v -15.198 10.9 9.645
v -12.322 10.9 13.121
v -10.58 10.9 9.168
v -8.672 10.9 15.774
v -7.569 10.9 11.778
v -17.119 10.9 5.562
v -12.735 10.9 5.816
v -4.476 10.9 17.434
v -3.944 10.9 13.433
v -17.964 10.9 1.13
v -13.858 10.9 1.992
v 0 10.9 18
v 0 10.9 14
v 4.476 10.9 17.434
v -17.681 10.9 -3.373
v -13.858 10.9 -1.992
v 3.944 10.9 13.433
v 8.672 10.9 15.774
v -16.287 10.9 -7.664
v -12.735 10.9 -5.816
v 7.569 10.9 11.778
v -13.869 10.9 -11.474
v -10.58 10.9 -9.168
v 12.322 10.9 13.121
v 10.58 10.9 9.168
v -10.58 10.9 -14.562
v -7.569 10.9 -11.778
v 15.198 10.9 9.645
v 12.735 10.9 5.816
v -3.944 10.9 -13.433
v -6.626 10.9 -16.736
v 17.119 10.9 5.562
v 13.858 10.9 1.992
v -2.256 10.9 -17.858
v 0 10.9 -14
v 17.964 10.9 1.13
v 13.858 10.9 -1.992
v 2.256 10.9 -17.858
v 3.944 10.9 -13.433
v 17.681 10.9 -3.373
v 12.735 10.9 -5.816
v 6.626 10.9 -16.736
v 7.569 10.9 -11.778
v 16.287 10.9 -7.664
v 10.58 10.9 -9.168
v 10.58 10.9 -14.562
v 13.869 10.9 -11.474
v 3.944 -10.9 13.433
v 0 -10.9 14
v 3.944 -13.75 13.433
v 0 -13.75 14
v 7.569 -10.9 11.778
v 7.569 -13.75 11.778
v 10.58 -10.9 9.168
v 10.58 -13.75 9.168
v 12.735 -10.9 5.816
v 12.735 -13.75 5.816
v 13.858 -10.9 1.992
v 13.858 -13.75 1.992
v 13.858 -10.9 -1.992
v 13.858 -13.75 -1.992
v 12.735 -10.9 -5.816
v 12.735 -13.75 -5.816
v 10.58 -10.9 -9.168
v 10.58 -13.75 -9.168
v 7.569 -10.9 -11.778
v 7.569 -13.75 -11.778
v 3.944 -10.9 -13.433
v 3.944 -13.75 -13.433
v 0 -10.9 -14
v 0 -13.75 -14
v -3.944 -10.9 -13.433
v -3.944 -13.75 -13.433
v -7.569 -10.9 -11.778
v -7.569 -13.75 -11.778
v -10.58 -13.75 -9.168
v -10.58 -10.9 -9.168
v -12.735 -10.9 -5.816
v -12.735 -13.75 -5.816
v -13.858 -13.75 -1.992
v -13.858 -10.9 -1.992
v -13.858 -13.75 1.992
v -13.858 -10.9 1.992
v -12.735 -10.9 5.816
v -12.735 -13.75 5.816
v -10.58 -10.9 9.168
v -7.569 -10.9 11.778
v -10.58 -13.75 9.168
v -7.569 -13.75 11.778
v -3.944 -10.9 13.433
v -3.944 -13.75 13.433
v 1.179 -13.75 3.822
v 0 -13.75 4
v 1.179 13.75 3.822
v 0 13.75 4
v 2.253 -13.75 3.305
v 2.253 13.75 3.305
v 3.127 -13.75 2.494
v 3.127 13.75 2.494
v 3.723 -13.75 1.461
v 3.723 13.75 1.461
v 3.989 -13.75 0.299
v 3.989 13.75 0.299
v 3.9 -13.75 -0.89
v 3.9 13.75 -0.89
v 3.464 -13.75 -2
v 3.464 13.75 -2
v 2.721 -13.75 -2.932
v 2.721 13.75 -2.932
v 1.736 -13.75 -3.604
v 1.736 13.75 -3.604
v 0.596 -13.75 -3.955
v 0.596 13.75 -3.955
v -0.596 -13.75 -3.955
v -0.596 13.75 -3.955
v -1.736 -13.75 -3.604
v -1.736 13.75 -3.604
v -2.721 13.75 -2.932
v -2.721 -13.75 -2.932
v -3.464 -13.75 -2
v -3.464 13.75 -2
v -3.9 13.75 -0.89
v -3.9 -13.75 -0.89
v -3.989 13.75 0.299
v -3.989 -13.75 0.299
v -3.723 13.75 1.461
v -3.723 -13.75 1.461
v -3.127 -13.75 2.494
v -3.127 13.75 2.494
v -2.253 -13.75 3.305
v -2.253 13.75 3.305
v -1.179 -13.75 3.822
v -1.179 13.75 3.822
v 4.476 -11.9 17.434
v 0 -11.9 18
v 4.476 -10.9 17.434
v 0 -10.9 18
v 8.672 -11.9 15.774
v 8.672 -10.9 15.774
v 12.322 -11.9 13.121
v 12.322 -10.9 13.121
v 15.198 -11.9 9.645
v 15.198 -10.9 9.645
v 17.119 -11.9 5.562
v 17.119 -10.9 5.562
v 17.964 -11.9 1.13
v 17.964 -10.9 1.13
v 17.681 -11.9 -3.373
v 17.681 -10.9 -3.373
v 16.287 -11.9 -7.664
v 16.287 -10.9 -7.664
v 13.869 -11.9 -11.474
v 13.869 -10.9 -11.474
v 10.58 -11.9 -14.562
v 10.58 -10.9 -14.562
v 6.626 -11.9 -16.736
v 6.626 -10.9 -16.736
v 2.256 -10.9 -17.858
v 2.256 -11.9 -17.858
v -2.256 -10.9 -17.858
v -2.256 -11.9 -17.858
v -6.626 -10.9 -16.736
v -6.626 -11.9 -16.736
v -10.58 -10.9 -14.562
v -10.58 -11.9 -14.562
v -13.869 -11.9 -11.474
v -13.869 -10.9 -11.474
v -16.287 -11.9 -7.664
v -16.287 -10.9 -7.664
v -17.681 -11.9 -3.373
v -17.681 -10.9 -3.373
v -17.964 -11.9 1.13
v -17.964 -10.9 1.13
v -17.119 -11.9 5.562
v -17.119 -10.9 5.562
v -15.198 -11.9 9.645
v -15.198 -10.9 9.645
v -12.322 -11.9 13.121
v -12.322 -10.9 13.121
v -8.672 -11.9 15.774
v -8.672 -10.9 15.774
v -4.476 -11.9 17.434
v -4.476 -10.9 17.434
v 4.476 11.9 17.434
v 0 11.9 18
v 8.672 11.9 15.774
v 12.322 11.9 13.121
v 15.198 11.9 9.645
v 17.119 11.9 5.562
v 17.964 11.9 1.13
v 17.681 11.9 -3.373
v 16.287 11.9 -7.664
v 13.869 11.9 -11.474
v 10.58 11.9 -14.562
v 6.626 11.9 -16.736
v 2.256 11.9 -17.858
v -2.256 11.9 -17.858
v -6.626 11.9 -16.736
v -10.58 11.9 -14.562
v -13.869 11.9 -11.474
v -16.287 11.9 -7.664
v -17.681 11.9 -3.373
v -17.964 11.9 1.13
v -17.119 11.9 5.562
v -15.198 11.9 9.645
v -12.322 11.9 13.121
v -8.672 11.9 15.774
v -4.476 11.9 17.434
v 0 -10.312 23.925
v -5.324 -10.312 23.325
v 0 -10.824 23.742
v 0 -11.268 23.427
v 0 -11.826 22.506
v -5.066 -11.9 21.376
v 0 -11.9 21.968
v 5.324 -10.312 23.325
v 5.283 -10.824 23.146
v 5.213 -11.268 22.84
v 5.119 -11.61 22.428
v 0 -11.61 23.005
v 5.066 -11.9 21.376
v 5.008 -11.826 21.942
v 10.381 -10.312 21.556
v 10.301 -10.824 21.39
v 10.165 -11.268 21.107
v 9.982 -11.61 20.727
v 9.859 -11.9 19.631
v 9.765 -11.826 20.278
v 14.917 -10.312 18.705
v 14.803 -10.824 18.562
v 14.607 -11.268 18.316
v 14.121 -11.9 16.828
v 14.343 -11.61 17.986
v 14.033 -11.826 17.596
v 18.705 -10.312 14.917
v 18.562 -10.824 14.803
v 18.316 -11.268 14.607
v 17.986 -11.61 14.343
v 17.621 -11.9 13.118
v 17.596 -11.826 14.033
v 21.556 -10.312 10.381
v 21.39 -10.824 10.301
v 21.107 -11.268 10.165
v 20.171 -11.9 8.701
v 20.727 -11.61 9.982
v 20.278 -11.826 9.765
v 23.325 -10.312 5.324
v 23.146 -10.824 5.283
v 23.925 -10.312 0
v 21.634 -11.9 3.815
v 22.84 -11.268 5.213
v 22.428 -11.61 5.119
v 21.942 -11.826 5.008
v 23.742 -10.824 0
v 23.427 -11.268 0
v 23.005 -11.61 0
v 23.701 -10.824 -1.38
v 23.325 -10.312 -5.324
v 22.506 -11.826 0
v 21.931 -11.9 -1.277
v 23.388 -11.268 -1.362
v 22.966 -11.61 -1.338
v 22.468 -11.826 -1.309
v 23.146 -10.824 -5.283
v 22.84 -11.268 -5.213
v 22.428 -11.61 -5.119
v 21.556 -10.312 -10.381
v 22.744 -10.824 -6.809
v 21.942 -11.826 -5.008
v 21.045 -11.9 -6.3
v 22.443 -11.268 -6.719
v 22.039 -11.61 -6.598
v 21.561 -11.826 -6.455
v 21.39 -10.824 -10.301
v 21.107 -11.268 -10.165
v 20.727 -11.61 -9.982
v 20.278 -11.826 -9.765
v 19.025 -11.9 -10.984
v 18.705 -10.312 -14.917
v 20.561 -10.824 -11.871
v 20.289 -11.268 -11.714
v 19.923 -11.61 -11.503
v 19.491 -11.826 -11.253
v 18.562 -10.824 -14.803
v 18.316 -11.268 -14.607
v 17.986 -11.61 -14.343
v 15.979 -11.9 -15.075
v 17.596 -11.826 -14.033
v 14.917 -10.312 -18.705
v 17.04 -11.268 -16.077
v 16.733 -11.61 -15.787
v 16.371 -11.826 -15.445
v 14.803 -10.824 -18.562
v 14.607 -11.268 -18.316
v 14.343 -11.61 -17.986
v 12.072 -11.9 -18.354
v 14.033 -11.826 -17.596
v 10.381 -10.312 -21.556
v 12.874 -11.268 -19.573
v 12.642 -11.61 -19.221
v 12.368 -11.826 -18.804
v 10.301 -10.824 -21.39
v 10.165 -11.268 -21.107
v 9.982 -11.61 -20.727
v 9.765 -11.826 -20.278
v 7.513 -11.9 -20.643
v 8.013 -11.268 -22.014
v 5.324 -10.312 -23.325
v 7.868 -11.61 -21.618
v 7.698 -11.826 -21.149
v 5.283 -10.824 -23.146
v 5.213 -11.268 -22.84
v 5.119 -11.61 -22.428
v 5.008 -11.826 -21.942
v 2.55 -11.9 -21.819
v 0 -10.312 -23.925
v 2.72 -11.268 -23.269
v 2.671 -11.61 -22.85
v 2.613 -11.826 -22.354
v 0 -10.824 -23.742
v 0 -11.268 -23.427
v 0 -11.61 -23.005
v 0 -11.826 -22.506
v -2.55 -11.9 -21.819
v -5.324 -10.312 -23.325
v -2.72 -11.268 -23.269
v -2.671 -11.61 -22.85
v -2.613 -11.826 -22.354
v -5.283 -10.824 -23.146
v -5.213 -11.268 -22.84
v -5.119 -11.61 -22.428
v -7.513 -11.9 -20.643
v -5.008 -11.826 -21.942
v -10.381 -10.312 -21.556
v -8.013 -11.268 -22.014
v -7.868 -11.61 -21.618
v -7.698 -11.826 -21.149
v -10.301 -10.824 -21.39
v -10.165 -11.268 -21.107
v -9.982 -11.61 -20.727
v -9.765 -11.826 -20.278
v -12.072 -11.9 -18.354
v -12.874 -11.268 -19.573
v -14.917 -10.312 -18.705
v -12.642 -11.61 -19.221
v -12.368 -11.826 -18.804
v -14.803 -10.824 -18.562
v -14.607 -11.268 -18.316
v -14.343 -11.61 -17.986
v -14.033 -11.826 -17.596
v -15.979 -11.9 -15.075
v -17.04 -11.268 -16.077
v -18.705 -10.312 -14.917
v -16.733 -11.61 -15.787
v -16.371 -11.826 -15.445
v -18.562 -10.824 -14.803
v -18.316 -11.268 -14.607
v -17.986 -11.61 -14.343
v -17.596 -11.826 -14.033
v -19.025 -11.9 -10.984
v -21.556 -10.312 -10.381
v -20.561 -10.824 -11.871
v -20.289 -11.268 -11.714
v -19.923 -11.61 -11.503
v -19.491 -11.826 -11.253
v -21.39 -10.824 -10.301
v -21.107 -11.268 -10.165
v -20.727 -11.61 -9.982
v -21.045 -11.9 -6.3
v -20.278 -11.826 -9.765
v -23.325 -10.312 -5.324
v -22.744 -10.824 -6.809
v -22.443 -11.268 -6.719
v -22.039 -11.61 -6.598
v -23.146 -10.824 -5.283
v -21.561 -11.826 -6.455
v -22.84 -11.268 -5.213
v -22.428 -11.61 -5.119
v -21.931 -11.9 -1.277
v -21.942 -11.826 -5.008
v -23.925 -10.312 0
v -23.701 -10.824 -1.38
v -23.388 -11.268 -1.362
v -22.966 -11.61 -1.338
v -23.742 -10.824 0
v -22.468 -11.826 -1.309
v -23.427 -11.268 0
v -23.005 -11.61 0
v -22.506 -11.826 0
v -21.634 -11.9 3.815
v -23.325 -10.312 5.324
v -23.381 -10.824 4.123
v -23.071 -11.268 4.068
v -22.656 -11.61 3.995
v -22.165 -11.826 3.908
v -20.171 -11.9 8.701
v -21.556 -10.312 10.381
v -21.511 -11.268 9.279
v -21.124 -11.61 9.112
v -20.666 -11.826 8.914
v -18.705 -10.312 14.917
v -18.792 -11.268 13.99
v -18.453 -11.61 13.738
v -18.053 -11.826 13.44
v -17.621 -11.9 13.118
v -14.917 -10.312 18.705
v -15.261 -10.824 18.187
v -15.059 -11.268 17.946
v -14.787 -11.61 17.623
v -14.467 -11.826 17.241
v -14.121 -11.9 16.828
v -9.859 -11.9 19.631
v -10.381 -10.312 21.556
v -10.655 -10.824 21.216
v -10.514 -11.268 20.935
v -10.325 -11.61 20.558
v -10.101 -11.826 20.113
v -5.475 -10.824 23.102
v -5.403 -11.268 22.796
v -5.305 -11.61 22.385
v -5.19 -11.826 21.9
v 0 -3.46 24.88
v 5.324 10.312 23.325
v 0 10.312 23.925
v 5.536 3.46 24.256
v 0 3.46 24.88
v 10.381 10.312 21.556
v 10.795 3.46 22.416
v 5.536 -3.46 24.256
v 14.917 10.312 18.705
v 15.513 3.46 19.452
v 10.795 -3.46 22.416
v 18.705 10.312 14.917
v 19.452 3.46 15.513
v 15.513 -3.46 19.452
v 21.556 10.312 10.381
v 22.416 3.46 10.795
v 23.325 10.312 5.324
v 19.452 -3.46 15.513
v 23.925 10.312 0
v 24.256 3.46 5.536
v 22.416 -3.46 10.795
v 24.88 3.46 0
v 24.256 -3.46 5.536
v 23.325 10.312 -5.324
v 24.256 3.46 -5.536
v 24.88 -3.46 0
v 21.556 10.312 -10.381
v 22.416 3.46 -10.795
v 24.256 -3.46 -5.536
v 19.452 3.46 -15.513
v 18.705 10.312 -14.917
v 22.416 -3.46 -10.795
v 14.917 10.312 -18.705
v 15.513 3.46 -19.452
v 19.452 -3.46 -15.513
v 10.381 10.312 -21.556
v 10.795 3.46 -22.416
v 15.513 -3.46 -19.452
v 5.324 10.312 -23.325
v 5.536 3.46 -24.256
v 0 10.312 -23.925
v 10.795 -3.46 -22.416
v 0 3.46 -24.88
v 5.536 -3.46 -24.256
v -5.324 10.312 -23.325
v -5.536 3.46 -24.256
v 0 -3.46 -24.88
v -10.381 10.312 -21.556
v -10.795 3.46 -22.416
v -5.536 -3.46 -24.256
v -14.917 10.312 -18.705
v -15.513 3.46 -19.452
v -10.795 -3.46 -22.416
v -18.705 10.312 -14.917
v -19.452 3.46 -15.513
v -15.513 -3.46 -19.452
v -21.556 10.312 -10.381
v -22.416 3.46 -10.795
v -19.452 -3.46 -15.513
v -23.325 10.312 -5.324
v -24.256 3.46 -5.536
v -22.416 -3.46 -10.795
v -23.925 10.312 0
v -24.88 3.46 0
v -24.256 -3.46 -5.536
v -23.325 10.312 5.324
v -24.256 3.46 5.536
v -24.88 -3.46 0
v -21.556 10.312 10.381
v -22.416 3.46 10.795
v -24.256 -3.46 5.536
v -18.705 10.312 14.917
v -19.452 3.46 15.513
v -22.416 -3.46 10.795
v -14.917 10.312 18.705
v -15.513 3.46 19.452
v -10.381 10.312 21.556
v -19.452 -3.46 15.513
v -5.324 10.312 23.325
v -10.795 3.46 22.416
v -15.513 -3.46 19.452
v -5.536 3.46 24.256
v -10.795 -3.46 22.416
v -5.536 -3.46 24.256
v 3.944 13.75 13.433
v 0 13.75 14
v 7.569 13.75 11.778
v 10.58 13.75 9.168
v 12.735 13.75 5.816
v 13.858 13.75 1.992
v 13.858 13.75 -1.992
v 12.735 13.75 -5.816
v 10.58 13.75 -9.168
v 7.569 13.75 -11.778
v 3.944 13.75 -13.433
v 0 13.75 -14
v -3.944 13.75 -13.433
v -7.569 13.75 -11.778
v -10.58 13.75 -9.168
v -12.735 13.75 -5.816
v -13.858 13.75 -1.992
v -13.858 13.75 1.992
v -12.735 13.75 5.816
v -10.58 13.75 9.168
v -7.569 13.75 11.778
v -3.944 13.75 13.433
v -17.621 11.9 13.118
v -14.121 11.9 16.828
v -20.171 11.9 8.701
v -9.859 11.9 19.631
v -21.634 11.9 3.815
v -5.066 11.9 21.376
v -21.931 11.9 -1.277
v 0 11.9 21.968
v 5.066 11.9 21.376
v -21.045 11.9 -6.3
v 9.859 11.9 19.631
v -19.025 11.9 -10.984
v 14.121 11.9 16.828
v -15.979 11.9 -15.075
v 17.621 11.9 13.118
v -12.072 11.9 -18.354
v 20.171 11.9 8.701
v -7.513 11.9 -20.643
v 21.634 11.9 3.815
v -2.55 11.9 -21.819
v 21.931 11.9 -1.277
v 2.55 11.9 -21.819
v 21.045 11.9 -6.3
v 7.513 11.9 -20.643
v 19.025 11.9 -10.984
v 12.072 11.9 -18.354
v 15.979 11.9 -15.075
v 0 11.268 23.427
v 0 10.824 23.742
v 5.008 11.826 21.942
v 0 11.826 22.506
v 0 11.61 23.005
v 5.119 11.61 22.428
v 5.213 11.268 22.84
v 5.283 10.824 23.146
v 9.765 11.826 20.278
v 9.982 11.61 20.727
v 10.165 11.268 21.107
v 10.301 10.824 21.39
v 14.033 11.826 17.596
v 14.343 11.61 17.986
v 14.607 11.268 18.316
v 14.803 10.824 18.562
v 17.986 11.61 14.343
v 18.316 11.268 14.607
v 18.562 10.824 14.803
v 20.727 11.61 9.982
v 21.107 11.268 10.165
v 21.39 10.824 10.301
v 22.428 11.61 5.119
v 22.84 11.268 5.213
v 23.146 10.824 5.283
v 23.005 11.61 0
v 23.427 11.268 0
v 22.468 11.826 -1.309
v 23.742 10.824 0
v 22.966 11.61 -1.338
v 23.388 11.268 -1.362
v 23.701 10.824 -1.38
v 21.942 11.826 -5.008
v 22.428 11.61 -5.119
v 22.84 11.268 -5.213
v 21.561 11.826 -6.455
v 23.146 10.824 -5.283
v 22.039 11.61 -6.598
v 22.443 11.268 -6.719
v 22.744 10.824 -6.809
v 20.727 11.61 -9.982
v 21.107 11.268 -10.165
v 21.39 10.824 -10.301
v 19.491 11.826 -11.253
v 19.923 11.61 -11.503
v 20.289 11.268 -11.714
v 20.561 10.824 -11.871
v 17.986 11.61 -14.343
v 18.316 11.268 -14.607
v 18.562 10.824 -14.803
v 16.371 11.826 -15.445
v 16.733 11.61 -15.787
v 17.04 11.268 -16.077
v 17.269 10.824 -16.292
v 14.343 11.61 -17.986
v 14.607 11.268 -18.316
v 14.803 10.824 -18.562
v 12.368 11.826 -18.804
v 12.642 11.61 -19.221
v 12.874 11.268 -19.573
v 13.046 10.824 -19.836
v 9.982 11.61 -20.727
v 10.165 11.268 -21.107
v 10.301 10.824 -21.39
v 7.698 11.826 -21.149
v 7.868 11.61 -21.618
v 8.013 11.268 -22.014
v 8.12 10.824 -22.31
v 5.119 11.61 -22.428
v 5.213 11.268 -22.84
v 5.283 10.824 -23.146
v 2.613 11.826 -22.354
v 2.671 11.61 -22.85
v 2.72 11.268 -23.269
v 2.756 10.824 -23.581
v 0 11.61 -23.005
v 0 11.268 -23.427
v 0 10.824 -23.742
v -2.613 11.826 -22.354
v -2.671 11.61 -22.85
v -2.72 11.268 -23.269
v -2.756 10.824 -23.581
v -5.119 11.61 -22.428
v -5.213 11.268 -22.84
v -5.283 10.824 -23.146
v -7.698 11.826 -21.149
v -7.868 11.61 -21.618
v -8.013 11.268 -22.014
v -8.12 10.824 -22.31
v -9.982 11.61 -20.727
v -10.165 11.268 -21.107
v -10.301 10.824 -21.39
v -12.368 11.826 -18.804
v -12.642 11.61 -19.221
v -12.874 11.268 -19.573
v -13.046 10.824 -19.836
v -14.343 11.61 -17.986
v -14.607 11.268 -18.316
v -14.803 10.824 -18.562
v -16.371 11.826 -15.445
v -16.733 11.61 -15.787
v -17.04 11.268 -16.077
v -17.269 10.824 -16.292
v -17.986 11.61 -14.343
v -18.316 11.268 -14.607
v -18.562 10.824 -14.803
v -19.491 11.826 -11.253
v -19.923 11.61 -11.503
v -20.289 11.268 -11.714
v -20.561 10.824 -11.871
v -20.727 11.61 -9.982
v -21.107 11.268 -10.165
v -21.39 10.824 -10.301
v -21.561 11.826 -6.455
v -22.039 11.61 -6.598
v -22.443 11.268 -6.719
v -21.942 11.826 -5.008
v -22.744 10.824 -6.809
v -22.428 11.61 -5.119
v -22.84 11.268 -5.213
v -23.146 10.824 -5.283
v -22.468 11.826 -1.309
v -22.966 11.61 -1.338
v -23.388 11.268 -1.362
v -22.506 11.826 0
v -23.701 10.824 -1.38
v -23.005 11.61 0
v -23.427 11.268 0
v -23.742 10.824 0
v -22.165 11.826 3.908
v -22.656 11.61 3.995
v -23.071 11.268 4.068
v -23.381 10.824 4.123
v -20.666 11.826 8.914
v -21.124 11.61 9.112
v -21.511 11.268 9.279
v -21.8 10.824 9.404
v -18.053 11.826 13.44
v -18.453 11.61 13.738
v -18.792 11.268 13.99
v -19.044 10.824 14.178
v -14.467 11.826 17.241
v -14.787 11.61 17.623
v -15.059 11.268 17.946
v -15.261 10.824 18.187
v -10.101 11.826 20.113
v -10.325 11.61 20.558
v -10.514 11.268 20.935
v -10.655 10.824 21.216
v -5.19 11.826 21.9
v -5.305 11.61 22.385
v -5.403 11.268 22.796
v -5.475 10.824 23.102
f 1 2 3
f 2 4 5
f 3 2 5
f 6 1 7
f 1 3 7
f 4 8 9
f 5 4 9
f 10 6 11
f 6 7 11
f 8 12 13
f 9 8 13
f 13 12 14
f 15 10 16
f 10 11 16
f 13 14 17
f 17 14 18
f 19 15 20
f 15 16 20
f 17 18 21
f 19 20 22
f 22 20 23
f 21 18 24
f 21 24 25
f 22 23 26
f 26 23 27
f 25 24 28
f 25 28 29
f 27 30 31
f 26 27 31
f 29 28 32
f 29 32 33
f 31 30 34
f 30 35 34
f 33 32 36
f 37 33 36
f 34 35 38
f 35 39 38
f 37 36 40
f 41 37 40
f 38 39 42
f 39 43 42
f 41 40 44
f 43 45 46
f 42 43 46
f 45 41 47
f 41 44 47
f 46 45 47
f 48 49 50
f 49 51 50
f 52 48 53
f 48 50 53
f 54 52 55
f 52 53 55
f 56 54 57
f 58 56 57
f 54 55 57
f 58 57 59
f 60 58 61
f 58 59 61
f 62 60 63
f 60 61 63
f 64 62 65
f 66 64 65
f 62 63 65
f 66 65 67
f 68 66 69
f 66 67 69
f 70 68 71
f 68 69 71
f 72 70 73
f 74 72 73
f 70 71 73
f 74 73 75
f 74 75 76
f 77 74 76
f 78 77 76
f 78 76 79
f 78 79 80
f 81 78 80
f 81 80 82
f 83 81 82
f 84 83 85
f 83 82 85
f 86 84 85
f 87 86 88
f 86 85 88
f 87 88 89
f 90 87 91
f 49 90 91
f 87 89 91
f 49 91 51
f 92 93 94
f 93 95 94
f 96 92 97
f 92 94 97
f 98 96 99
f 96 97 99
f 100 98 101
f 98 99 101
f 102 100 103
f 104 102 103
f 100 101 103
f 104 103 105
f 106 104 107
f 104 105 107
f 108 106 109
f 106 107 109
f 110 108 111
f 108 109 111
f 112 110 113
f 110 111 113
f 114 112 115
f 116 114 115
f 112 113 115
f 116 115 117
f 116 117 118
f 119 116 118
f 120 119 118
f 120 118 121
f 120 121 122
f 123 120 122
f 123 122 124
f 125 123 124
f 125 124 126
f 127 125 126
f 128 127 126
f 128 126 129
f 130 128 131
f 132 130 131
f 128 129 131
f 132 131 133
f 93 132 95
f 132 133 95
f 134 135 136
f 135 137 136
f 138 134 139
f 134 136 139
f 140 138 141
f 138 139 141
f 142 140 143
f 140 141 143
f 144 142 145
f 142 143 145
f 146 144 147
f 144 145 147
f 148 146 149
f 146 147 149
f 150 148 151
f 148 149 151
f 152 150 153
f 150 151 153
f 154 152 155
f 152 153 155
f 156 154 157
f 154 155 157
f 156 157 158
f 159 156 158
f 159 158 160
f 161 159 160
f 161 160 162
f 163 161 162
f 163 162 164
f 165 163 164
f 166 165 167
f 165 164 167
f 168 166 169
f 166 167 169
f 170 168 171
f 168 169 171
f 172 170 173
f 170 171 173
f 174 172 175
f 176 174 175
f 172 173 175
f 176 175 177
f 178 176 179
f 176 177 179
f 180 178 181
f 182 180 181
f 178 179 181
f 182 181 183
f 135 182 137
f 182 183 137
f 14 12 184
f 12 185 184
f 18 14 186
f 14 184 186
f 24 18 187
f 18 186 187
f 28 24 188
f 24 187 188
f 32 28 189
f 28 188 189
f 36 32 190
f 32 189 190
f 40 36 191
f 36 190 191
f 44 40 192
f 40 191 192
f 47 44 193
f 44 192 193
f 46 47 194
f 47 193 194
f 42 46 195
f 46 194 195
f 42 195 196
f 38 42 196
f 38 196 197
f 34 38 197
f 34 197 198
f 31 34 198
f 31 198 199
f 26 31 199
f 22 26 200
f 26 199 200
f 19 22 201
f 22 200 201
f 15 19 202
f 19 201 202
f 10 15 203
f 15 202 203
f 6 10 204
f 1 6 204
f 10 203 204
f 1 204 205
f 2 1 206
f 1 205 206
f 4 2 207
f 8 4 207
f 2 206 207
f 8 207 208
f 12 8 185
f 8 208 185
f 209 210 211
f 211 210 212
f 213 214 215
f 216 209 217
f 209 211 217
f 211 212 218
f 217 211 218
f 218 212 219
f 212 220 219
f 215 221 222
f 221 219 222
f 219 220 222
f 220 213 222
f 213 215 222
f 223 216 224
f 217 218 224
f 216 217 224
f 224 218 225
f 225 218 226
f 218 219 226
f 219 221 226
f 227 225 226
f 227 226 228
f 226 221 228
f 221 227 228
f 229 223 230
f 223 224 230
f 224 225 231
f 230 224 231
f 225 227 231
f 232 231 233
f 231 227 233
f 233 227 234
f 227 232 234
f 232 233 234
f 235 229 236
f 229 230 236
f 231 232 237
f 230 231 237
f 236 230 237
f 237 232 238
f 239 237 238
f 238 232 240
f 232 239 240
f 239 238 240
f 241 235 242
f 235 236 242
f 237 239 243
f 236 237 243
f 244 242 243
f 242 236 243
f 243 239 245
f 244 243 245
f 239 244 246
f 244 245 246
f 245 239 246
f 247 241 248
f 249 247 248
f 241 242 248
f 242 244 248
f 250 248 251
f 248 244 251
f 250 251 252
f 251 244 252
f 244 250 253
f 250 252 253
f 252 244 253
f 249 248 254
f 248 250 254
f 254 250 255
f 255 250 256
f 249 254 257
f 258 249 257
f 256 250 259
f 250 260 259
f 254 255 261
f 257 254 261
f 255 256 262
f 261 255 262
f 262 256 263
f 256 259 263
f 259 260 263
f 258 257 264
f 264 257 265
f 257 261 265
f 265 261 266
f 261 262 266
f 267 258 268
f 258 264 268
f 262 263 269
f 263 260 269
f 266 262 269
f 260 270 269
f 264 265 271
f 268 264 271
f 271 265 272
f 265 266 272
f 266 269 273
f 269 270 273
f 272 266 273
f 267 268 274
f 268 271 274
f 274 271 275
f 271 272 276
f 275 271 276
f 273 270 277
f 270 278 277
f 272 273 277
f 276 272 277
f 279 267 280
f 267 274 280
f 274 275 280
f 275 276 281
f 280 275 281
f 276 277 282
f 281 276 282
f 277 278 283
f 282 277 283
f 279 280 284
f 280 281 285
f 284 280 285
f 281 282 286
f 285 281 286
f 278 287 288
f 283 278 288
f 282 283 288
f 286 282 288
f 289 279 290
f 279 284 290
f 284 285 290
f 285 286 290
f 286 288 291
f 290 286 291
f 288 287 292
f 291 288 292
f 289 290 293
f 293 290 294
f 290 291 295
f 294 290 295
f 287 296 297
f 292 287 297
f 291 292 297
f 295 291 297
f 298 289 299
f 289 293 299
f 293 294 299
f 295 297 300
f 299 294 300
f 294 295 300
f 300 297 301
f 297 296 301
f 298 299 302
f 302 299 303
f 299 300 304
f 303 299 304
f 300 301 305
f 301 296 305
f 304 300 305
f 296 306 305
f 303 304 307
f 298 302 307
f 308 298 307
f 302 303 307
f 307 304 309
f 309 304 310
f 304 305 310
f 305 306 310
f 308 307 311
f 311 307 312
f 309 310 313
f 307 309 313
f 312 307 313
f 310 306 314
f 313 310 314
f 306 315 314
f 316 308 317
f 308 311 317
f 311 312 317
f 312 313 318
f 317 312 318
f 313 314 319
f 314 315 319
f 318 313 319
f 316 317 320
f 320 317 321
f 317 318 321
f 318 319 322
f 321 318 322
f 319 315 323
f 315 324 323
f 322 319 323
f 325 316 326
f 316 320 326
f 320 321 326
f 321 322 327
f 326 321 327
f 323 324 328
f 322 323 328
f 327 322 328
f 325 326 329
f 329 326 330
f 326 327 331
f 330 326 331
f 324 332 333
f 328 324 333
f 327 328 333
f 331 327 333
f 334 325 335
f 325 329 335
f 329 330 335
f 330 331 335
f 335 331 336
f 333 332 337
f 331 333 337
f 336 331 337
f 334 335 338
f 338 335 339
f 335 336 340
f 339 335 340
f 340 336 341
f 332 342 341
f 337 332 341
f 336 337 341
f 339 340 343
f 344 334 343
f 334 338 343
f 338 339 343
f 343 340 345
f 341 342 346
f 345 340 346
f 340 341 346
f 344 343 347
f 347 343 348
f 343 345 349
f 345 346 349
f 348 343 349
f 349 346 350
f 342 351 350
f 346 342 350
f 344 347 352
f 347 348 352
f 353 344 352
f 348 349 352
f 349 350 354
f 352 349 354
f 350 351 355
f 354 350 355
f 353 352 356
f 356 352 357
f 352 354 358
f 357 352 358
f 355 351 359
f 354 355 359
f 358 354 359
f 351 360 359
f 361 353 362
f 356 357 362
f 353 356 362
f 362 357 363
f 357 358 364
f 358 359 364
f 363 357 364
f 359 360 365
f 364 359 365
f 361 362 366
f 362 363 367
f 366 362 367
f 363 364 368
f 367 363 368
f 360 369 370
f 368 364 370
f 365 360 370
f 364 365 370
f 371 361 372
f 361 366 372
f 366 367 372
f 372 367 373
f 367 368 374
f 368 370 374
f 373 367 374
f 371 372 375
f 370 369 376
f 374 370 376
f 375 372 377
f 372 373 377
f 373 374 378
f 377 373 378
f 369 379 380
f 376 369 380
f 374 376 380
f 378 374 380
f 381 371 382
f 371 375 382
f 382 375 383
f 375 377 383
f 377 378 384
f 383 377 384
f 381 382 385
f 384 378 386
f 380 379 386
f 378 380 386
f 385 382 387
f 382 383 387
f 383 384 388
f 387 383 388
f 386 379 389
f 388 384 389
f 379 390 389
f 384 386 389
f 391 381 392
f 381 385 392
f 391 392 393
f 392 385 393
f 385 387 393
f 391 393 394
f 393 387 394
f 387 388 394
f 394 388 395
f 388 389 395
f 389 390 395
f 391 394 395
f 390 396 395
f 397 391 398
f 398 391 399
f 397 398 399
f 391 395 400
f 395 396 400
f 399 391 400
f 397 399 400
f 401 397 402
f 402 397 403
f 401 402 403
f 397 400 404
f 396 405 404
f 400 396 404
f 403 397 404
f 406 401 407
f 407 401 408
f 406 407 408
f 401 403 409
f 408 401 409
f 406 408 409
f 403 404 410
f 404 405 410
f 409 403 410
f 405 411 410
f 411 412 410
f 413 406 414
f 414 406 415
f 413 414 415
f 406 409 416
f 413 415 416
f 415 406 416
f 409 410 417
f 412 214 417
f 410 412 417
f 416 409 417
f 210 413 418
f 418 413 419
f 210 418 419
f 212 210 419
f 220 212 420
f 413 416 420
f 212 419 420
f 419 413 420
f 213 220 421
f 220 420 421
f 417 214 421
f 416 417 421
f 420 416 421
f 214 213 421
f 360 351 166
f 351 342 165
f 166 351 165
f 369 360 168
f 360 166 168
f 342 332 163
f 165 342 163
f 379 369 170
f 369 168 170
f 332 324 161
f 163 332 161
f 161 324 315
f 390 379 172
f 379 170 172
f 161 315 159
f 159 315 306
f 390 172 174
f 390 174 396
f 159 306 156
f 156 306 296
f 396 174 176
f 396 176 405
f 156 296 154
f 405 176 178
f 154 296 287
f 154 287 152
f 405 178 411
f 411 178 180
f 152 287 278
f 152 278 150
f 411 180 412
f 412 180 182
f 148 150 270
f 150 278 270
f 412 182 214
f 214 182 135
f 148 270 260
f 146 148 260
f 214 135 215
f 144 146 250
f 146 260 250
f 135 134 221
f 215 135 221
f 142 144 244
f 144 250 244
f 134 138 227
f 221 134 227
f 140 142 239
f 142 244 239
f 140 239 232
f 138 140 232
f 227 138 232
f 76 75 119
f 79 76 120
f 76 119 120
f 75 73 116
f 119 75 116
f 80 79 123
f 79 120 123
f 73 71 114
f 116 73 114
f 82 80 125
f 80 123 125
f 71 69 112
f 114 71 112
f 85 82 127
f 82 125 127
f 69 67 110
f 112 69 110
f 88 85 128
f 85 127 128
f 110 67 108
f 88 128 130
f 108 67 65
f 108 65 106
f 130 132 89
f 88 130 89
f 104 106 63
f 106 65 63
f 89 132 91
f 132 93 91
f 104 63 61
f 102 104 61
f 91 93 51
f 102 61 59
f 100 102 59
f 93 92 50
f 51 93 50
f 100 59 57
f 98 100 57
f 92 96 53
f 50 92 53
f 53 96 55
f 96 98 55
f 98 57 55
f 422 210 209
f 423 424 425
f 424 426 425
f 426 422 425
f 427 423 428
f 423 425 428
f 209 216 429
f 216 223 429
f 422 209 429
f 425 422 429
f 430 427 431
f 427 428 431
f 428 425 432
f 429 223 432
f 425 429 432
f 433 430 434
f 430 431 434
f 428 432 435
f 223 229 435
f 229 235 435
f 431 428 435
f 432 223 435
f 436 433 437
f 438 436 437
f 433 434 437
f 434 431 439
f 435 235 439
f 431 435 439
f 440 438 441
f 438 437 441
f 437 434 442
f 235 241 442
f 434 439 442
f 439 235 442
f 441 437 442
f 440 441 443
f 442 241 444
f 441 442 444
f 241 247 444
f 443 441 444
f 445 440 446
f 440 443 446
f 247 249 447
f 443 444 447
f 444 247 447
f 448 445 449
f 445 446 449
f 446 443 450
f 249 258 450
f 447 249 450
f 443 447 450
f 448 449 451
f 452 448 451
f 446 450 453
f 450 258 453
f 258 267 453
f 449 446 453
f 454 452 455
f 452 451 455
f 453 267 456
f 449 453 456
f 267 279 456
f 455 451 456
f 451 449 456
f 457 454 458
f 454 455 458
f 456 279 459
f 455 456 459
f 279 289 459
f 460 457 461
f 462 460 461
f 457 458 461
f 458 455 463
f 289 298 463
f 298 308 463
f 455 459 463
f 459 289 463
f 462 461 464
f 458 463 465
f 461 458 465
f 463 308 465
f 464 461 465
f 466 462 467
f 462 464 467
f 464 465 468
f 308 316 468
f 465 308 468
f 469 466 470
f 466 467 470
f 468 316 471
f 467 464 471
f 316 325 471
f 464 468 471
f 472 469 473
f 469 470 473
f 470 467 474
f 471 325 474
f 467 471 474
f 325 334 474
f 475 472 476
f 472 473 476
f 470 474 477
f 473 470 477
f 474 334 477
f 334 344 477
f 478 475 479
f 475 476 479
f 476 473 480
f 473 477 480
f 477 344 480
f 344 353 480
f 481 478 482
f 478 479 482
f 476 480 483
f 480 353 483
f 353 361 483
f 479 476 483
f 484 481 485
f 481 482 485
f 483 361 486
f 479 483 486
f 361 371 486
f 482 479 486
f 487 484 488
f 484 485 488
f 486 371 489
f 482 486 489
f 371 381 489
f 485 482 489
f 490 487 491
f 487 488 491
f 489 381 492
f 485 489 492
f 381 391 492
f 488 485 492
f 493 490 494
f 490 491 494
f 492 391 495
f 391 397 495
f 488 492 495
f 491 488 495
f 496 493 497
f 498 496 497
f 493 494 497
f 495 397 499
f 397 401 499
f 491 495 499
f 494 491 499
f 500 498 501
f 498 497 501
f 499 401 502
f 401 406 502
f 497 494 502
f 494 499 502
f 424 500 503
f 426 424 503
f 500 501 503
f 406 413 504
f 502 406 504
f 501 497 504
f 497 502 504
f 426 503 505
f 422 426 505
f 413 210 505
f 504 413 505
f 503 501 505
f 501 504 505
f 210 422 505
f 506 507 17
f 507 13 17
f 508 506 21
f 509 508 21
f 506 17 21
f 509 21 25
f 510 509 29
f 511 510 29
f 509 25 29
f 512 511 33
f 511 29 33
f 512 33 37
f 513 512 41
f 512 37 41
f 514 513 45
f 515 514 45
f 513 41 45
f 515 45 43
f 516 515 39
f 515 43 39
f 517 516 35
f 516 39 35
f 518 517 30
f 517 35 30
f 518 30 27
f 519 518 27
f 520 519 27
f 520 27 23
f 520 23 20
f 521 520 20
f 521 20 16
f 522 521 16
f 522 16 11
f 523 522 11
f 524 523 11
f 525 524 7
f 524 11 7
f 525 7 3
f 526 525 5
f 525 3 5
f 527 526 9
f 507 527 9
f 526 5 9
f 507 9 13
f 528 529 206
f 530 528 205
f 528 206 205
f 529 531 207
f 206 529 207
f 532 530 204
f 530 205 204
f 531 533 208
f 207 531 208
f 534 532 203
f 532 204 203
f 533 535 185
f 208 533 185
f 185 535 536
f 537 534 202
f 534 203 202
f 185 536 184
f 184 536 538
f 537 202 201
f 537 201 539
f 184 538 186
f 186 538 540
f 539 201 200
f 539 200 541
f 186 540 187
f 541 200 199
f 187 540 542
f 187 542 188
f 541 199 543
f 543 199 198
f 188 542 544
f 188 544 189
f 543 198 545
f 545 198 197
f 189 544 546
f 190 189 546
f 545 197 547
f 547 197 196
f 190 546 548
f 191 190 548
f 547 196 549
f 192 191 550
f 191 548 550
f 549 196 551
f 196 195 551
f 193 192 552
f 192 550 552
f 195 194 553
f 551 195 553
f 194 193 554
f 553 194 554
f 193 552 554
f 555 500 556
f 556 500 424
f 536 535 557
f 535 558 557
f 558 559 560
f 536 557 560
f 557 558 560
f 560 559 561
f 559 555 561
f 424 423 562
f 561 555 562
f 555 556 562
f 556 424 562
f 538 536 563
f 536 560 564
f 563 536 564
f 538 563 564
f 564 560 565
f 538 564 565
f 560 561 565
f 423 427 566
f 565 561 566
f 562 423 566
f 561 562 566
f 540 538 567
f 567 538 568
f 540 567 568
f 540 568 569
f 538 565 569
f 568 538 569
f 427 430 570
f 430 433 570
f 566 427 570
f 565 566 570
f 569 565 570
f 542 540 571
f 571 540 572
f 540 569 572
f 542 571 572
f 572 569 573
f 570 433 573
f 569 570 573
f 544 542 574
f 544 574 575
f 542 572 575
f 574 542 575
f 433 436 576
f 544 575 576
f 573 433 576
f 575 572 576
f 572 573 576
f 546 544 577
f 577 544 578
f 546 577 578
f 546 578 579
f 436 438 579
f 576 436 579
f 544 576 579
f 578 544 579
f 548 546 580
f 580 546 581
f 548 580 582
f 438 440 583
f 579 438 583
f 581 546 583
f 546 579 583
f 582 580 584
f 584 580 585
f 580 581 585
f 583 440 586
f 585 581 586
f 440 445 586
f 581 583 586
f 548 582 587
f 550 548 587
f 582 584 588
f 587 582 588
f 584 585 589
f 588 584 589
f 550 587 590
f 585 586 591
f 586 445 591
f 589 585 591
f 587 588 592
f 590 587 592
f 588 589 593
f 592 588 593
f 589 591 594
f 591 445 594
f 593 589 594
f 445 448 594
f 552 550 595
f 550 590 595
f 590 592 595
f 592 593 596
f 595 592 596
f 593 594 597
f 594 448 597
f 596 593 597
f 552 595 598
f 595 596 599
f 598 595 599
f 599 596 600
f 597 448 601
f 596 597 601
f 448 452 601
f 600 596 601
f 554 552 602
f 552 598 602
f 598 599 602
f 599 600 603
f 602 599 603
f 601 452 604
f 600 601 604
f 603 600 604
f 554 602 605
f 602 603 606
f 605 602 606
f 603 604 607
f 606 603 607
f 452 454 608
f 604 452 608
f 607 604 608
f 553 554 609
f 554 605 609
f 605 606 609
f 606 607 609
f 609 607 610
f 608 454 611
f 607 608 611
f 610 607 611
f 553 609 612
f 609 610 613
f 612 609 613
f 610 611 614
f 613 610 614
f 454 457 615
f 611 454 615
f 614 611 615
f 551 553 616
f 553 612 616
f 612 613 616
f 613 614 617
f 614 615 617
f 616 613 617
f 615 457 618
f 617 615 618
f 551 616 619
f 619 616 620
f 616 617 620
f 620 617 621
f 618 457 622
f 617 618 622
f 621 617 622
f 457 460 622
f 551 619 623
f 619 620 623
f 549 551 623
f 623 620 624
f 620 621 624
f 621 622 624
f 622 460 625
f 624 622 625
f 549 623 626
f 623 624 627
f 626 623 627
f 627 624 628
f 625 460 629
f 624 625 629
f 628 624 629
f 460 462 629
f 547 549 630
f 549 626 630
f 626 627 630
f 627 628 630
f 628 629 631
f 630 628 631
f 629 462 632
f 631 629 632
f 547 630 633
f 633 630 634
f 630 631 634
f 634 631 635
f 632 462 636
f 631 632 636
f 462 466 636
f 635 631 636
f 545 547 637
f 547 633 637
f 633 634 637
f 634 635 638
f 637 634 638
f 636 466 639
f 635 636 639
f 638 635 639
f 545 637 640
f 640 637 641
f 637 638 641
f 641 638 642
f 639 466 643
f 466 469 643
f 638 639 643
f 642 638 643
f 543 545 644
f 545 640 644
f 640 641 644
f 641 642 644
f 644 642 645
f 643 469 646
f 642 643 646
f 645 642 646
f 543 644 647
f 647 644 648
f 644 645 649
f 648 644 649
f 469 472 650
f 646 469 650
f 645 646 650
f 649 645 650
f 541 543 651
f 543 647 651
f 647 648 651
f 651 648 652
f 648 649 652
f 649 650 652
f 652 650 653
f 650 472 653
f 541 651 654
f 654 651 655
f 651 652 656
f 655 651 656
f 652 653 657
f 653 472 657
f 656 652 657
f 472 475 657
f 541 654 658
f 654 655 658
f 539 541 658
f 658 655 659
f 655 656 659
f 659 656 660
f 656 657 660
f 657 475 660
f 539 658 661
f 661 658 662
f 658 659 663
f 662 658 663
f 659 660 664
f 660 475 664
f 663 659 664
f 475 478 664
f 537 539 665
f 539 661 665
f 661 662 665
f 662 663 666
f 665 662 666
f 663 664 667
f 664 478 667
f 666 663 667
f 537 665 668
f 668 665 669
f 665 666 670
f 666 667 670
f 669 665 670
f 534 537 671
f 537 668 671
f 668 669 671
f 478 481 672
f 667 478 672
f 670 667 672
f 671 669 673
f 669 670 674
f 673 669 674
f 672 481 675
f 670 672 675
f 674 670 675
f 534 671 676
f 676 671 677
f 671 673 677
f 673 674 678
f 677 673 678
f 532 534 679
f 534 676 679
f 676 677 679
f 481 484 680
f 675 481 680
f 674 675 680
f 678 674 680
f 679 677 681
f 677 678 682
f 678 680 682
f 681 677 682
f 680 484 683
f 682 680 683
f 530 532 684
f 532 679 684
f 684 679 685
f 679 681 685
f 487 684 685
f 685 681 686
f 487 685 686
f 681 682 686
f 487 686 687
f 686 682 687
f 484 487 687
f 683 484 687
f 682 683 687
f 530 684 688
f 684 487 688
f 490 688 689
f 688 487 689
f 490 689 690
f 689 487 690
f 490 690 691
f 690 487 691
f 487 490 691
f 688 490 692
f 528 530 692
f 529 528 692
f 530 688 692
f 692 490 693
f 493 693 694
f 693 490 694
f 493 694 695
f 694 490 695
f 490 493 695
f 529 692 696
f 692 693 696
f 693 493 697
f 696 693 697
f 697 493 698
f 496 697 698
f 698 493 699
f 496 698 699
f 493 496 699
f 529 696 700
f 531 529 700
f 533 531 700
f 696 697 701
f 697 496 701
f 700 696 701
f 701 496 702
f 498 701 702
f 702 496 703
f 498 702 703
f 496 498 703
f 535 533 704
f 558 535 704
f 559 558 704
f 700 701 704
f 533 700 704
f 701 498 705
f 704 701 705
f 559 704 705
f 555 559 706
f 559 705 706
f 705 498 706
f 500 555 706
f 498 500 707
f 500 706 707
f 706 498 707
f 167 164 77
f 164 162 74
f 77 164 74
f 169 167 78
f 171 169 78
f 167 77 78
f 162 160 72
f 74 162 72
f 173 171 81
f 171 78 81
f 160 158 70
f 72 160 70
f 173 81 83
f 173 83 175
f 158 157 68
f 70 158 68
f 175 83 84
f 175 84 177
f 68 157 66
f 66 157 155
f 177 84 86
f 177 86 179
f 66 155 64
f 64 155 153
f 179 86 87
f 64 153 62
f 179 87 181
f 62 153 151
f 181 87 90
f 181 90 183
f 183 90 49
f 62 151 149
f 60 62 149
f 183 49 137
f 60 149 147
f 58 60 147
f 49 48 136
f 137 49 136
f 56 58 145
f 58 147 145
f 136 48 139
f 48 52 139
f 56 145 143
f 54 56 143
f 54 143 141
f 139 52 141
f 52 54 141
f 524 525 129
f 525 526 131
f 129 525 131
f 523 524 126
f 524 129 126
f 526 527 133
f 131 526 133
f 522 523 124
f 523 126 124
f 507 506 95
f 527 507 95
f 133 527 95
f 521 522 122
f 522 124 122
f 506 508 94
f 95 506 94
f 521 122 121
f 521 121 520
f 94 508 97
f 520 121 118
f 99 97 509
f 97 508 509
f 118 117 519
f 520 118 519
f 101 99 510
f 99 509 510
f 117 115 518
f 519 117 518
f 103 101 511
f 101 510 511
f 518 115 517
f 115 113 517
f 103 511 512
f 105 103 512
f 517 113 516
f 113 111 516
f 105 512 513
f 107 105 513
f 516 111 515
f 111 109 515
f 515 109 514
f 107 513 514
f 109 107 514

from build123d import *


with BuildPart() as part:
    # 草图1 → 旋转1 (revolve)
    with BuildSketch(Plane(origin=(0, 0, 0), x_dir=(-1, 0, 0), z_dir=(0, 0, -1)), mode=Mode.PRIVATE) as revolve_1_sk:
        with BuildLine():
            Line((-14, -13.75), (-4, -13.75))
            Line((-4, -13.75), (-4, 13.75))
            Line((-4, 13.75), (-14, 13.75))
            Line((-14, 13.75), (-14, 10.9))
            Line((-14, 10.9), (-18, 10.9))
            Line((-18, 10.9), (-18, 11.9))
            Line((-18, 11.9), (-21.967967808, 11.9))
            ThreePointArc((-21.967967808, 11.9), (-23.227928125, 11.453222457), (-23.924966467, 10.3125))
            ThreePointArc((-23.924966467, 10.3125), (-25, 0), (-23.924966467, -10.3125))
            ThreePointArc((-23.924966467, -10.3125), (-23.227928125, -11.453222457), (-21.967967808, -11.9))
            Line((-21.967967808, -11.9), (-18, -11.9))
            Line((-18, -11.9), (-18, -10.9))
            Line((-18, -10.9), (-14, -10.9))
            Line((-14, -10.9), (-14, -13.75))
        make_face()
    revolve(revolve_1_sk.sketch.rotate(Axis((0, -13.75, 0), (0, 1, 0)), 270), axis=Axis((0, -13.75, 0), (0, 1, 0)))


solid = part.part
